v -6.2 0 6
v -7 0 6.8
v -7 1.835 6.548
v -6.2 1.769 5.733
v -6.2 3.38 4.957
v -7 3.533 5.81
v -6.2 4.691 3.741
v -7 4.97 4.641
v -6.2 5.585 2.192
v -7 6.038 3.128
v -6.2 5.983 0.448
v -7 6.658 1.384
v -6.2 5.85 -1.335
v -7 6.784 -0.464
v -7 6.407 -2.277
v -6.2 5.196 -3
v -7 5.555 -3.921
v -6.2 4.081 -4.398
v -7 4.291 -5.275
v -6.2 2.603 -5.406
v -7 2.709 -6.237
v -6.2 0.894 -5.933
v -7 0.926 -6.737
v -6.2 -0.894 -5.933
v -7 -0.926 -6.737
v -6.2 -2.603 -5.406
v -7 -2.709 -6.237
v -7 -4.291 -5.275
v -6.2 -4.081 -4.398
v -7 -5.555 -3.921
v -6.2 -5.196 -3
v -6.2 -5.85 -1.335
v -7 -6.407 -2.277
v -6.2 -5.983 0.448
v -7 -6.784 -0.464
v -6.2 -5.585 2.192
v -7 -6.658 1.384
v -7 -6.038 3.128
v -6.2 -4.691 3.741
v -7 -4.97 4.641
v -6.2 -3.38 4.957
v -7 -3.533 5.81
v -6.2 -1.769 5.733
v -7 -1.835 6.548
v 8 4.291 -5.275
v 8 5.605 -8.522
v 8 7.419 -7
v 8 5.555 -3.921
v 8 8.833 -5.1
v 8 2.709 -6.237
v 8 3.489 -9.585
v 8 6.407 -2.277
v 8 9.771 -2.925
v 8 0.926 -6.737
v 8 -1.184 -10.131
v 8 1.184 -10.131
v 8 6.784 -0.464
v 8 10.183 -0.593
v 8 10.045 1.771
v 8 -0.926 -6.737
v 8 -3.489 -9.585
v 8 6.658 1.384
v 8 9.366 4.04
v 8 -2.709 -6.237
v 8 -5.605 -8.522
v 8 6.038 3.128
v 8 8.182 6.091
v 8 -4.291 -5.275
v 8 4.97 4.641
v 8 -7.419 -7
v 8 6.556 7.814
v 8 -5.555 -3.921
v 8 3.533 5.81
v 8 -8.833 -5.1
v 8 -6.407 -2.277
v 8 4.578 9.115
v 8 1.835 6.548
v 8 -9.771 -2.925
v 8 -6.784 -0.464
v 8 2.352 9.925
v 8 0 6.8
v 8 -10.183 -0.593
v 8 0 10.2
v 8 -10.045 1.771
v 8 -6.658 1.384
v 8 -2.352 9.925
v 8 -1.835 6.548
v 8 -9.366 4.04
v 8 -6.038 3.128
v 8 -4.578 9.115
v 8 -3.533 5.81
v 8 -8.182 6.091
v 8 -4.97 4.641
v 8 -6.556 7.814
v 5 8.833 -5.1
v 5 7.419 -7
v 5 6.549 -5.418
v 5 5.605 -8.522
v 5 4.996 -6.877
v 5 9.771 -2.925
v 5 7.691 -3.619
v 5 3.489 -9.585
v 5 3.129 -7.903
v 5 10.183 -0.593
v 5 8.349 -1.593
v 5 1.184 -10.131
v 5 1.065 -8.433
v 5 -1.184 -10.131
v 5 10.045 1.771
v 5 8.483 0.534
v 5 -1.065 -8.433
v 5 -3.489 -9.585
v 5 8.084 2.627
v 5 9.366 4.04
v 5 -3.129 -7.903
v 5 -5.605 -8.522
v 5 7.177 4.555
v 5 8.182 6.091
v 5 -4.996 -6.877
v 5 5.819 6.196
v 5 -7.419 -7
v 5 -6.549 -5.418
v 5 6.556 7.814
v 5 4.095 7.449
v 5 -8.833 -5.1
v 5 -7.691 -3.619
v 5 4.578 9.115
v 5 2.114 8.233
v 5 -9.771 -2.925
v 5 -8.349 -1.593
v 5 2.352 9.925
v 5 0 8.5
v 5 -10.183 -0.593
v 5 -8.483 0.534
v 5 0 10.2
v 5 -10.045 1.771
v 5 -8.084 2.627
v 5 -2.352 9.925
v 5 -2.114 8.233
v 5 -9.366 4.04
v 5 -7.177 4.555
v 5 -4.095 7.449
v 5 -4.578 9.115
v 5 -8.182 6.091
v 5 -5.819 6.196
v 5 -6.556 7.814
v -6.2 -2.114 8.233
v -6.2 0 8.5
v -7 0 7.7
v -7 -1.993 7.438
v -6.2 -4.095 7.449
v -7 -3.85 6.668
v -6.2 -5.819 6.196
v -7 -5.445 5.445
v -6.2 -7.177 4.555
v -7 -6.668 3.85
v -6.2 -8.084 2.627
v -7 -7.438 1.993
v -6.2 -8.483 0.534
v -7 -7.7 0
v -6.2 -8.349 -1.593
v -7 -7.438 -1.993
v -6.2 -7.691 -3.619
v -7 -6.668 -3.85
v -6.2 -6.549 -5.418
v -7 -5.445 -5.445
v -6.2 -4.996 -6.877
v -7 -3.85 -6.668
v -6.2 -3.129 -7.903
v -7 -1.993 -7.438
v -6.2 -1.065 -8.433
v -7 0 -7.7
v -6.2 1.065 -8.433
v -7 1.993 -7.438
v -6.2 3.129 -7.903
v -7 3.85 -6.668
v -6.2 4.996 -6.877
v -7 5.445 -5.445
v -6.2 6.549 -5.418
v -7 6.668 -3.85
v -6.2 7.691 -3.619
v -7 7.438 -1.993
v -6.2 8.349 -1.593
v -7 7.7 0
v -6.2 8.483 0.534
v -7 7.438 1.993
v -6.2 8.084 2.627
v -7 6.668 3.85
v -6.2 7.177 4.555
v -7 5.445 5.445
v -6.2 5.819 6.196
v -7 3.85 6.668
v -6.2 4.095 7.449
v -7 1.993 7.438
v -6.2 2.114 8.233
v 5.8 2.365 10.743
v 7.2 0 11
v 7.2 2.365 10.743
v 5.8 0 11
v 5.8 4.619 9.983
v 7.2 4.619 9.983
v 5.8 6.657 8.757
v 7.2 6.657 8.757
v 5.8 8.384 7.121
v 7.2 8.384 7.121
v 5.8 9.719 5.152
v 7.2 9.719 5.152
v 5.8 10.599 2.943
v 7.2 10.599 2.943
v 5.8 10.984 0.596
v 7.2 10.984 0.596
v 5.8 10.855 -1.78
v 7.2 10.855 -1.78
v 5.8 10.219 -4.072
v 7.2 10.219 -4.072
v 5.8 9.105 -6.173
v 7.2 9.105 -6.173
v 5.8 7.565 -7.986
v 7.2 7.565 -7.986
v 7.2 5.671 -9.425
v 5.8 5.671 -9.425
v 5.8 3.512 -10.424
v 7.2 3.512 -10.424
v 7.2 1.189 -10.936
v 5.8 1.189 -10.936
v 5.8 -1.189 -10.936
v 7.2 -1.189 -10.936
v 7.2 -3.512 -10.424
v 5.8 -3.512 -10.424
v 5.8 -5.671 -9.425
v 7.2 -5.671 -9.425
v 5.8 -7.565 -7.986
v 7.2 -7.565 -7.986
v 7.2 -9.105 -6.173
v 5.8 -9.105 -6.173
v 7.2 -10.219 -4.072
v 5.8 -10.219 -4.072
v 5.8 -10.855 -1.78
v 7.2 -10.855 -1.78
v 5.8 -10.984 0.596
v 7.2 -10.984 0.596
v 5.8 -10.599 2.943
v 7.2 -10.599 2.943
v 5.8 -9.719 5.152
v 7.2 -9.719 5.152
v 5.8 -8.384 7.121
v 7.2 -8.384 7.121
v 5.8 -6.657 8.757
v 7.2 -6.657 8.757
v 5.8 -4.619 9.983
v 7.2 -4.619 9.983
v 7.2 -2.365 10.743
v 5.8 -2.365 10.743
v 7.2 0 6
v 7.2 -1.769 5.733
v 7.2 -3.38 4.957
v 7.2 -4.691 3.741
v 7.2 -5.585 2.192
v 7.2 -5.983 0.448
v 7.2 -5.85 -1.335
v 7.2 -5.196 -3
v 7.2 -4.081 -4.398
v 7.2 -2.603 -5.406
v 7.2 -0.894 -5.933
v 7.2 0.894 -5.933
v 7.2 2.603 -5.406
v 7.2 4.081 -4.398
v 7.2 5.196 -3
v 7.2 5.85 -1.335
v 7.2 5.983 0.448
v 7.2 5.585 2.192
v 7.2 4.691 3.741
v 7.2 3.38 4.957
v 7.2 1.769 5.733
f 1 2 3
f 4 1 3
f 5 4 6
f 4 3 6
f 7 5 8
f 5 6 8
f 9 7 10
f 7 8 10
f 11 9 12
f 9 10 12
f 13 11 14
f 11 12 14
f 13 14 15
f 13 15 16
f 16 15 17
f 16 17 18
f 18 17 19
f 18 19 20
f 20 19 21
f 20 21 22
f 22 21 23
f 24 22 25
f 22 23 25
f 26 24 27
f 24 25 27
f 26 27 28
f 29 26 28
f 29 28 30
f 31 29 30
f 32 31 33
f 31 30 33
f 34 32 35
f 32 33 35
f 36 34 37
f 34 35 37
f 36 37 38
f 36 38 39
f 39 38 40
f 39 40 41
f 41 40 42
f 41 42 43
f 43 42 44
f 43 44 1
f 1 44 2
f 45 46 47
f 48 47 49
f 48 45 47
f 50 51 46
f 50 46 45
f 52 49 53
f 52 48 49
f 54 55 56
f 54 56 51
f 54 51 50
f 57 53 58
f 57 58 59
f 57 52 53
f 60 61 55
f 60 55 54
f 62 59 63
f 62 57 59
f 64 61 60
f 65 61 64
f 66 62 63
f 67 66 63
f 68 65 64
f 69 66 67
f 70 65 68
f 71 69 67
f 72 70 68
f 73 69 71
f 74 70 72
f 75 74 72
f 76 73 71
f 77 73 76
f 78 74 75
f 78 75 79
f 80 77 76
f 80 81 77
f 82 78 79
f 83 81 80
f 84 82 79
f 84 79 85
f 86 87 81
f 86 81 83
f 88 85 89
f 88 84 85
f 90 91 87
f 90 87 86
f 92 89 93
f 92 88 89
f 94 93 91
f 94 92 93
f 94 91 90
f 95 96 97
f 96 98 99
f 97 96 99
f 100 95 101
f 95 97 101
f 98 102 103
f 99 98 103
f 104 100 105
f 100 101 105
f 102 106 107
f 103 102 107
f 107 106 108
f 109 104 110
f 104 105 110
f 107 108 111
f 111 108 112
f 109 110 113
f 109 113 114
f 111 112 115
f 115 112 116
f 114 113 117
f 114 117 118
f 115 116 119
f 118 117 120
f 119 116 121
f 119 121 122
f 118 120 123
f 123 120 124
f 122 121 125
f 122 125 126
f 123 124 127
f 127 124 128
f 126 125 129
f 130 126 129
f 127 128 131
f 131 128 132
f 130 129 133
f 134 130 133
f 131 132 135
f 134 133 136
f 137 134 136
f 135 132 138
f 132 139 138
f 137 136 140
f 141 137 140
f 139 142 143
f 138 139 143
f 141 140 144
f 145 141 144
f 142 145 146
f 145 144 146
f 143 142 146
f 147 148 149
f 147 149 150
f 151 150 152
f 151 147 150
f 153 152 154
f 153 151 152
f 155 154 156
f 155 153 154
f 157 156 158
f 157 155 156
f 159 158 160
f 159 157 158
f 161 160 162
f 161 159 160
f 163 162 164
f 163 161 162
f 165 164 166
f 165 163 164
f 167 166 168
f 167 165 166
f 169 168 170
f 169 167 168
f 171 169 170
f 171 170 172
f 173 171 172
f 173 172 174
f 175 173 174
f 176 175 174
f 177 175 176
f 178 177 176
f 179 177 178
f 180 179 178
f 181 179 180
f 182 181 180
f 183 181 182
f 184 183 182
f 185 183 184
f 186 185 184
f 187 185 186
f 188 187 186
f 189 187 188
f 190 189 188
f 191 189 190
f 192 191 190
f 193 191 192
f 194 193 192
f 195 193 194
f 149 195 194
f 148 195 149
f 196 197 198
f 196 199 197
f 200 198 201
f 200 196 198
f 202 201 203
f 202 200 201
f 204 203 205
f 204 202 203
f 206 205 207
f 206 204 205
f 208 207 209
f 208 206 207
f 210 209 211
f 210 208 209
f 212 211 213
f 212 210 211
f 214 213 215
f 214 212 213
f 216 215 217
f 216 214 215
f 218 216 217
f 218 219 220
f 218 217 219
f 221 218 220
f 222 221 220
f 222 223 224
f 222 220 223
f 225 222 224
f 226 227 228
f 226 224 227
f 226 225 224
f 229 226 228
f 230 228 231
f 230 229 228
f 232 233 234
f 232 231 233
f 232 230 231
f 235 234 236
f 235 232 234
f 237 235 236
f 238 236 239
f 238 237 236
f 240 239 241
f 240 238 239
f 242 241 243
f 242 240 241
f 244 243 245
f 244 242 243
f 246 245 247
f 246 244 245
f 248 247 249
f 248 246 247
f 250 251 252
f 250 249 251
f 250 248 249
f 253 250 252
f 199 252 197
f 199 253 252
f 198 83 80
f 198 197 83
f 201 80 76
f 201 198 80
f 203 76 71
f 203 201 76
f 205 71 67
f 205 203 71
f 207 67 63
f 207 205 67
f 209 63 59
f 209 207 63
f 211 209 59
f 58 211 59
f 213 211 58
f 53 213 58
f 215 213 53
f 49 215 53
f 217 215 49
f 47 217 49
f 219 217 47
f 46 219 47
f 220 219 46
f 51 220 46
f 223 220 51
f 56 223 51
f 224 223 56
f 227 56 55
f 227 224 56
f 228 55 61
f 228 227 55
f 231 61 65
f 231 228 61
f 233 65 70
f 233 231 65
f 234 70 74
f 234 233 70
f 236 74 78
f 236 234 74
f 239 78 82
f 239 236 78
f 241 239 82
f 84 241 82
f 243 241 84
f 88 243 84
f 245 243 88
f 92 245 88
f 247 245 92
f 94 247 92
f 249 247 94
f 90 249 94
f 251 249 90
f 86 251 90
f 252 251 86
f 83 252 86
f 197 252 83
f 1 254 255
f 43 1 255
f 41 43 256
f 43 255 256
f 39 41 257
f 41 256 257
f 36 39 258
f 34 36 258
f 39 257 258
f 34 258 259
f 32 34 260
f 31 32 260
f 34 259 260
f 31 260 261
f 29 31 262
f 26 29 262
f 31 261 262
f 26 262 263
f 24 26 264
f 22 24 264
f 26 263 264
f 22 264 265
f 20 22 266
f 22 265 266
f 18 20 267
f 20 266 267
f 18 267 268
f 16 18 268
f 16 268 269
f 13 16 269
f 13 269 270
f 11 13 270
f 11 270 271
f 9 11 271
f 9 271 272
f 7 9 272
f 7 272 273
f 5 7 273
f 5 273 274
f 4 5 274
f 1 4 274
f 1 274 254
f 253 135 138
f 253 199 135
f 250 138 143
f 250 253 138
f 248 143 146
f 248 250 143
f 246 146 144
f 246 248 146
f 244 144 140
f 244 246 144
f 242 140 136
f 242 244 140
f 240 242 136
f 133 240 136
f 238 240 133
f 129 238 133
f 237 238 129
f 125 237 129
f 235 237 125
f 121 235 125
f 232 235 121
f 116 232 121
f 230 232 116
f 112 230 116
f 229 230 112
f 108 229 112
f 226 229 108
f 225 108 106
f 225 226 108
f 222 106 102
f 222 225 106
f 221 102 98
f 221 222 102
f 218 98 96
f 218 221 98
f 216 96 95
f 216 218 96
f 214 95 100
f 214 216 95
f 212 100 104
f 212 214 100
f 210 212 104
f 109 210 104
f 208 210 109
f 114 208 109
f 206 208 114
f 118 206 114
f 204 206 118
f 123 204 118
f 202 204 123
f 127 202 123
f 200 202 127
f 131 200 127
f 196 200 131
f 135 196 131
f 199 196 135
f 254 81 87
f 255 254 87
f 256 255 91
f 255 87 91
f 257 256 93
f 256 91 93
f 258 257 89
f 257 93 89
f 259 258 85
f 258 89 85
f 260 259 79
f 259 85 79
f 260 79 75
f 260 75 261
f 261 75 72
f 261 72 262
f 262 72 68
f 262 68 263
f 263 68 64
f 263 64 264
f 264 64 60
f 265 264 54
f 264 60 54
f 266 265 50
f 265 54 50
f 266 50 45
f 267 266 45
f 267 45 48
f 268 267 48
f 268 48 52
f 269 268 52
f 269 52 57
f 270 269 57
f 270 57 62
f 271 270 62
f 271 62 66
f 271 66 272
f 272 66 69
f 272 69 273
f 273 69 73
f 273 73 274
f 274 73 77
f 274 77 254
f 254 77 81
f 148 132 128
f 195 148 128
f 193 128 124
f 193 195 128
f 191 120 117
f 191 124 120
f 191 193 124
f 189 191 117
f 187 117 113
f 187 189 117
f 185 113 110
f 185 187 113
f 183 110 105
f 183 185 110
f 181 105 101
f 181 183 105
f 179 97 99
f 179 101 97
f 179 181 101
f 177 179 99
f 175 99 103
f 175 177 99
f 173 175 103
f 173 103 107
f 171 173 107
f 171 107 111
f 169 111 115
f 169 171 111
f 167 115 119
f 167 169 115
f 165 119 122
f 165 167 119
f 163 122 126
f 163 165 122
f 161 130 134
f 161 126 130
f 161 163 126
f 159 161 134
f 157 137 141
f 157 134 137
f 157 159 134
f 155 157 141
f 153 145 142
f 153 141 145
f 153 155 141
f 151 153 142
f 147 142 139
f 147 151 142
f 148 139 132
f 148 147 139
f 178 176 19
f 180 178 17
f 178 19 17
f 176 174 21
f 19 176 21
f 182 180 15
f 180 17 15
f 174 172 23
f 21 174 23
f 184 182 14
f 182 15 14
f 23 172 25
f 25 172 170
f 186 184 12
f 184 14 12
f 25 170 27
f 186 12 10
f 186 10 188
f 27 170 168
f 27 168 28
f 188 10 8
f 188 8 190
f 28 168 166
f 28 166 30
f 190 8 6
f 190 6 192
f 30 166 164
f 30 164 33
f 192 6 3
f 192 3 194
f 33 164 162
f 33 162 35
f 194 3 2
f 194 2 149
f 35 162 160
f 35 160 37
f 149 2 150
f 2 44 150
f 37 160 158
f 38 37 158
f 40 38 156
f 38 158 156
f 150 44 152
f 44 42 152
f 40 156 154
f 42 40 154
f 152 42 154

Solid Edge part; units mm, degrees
sketch "Sketch1" plane through (0, 0, 0) normal (0, -1, 0) x (1, 0, 0)
  line L0 (5, 11) -> (5, 8.5)
  line L1 (5, 8.5) -> (-7, 8.5)
  line L2 (-7, 8.5) -> (-7, 6)
  line L3 (-7, 6) -> (8, 6)
  line L4 (8, 6) -> (8, 11)
  line L5 (8, 11) -> (5, 11)
  dimension "D1" = 3
  dimension "D2" = 15
  dimension "D3" = 6
  dimension "D4" = 8.5
  dimension "D5" = 11
revolve "RevolvedProtrusion1" add sketch "Sketch1" angle 360 about axis through (0, 0, 0) along (1, 0, 0)
chamfer "Chamfer1" distance 0.8 angle 45 5 edges at (8, 0, -6) (8, 0, -11) (5, 0, -11) (-7, 0, -8.5) (-7, 0, -6)
properties part number "1976-1300-C05" material "Bronce, 90%"
